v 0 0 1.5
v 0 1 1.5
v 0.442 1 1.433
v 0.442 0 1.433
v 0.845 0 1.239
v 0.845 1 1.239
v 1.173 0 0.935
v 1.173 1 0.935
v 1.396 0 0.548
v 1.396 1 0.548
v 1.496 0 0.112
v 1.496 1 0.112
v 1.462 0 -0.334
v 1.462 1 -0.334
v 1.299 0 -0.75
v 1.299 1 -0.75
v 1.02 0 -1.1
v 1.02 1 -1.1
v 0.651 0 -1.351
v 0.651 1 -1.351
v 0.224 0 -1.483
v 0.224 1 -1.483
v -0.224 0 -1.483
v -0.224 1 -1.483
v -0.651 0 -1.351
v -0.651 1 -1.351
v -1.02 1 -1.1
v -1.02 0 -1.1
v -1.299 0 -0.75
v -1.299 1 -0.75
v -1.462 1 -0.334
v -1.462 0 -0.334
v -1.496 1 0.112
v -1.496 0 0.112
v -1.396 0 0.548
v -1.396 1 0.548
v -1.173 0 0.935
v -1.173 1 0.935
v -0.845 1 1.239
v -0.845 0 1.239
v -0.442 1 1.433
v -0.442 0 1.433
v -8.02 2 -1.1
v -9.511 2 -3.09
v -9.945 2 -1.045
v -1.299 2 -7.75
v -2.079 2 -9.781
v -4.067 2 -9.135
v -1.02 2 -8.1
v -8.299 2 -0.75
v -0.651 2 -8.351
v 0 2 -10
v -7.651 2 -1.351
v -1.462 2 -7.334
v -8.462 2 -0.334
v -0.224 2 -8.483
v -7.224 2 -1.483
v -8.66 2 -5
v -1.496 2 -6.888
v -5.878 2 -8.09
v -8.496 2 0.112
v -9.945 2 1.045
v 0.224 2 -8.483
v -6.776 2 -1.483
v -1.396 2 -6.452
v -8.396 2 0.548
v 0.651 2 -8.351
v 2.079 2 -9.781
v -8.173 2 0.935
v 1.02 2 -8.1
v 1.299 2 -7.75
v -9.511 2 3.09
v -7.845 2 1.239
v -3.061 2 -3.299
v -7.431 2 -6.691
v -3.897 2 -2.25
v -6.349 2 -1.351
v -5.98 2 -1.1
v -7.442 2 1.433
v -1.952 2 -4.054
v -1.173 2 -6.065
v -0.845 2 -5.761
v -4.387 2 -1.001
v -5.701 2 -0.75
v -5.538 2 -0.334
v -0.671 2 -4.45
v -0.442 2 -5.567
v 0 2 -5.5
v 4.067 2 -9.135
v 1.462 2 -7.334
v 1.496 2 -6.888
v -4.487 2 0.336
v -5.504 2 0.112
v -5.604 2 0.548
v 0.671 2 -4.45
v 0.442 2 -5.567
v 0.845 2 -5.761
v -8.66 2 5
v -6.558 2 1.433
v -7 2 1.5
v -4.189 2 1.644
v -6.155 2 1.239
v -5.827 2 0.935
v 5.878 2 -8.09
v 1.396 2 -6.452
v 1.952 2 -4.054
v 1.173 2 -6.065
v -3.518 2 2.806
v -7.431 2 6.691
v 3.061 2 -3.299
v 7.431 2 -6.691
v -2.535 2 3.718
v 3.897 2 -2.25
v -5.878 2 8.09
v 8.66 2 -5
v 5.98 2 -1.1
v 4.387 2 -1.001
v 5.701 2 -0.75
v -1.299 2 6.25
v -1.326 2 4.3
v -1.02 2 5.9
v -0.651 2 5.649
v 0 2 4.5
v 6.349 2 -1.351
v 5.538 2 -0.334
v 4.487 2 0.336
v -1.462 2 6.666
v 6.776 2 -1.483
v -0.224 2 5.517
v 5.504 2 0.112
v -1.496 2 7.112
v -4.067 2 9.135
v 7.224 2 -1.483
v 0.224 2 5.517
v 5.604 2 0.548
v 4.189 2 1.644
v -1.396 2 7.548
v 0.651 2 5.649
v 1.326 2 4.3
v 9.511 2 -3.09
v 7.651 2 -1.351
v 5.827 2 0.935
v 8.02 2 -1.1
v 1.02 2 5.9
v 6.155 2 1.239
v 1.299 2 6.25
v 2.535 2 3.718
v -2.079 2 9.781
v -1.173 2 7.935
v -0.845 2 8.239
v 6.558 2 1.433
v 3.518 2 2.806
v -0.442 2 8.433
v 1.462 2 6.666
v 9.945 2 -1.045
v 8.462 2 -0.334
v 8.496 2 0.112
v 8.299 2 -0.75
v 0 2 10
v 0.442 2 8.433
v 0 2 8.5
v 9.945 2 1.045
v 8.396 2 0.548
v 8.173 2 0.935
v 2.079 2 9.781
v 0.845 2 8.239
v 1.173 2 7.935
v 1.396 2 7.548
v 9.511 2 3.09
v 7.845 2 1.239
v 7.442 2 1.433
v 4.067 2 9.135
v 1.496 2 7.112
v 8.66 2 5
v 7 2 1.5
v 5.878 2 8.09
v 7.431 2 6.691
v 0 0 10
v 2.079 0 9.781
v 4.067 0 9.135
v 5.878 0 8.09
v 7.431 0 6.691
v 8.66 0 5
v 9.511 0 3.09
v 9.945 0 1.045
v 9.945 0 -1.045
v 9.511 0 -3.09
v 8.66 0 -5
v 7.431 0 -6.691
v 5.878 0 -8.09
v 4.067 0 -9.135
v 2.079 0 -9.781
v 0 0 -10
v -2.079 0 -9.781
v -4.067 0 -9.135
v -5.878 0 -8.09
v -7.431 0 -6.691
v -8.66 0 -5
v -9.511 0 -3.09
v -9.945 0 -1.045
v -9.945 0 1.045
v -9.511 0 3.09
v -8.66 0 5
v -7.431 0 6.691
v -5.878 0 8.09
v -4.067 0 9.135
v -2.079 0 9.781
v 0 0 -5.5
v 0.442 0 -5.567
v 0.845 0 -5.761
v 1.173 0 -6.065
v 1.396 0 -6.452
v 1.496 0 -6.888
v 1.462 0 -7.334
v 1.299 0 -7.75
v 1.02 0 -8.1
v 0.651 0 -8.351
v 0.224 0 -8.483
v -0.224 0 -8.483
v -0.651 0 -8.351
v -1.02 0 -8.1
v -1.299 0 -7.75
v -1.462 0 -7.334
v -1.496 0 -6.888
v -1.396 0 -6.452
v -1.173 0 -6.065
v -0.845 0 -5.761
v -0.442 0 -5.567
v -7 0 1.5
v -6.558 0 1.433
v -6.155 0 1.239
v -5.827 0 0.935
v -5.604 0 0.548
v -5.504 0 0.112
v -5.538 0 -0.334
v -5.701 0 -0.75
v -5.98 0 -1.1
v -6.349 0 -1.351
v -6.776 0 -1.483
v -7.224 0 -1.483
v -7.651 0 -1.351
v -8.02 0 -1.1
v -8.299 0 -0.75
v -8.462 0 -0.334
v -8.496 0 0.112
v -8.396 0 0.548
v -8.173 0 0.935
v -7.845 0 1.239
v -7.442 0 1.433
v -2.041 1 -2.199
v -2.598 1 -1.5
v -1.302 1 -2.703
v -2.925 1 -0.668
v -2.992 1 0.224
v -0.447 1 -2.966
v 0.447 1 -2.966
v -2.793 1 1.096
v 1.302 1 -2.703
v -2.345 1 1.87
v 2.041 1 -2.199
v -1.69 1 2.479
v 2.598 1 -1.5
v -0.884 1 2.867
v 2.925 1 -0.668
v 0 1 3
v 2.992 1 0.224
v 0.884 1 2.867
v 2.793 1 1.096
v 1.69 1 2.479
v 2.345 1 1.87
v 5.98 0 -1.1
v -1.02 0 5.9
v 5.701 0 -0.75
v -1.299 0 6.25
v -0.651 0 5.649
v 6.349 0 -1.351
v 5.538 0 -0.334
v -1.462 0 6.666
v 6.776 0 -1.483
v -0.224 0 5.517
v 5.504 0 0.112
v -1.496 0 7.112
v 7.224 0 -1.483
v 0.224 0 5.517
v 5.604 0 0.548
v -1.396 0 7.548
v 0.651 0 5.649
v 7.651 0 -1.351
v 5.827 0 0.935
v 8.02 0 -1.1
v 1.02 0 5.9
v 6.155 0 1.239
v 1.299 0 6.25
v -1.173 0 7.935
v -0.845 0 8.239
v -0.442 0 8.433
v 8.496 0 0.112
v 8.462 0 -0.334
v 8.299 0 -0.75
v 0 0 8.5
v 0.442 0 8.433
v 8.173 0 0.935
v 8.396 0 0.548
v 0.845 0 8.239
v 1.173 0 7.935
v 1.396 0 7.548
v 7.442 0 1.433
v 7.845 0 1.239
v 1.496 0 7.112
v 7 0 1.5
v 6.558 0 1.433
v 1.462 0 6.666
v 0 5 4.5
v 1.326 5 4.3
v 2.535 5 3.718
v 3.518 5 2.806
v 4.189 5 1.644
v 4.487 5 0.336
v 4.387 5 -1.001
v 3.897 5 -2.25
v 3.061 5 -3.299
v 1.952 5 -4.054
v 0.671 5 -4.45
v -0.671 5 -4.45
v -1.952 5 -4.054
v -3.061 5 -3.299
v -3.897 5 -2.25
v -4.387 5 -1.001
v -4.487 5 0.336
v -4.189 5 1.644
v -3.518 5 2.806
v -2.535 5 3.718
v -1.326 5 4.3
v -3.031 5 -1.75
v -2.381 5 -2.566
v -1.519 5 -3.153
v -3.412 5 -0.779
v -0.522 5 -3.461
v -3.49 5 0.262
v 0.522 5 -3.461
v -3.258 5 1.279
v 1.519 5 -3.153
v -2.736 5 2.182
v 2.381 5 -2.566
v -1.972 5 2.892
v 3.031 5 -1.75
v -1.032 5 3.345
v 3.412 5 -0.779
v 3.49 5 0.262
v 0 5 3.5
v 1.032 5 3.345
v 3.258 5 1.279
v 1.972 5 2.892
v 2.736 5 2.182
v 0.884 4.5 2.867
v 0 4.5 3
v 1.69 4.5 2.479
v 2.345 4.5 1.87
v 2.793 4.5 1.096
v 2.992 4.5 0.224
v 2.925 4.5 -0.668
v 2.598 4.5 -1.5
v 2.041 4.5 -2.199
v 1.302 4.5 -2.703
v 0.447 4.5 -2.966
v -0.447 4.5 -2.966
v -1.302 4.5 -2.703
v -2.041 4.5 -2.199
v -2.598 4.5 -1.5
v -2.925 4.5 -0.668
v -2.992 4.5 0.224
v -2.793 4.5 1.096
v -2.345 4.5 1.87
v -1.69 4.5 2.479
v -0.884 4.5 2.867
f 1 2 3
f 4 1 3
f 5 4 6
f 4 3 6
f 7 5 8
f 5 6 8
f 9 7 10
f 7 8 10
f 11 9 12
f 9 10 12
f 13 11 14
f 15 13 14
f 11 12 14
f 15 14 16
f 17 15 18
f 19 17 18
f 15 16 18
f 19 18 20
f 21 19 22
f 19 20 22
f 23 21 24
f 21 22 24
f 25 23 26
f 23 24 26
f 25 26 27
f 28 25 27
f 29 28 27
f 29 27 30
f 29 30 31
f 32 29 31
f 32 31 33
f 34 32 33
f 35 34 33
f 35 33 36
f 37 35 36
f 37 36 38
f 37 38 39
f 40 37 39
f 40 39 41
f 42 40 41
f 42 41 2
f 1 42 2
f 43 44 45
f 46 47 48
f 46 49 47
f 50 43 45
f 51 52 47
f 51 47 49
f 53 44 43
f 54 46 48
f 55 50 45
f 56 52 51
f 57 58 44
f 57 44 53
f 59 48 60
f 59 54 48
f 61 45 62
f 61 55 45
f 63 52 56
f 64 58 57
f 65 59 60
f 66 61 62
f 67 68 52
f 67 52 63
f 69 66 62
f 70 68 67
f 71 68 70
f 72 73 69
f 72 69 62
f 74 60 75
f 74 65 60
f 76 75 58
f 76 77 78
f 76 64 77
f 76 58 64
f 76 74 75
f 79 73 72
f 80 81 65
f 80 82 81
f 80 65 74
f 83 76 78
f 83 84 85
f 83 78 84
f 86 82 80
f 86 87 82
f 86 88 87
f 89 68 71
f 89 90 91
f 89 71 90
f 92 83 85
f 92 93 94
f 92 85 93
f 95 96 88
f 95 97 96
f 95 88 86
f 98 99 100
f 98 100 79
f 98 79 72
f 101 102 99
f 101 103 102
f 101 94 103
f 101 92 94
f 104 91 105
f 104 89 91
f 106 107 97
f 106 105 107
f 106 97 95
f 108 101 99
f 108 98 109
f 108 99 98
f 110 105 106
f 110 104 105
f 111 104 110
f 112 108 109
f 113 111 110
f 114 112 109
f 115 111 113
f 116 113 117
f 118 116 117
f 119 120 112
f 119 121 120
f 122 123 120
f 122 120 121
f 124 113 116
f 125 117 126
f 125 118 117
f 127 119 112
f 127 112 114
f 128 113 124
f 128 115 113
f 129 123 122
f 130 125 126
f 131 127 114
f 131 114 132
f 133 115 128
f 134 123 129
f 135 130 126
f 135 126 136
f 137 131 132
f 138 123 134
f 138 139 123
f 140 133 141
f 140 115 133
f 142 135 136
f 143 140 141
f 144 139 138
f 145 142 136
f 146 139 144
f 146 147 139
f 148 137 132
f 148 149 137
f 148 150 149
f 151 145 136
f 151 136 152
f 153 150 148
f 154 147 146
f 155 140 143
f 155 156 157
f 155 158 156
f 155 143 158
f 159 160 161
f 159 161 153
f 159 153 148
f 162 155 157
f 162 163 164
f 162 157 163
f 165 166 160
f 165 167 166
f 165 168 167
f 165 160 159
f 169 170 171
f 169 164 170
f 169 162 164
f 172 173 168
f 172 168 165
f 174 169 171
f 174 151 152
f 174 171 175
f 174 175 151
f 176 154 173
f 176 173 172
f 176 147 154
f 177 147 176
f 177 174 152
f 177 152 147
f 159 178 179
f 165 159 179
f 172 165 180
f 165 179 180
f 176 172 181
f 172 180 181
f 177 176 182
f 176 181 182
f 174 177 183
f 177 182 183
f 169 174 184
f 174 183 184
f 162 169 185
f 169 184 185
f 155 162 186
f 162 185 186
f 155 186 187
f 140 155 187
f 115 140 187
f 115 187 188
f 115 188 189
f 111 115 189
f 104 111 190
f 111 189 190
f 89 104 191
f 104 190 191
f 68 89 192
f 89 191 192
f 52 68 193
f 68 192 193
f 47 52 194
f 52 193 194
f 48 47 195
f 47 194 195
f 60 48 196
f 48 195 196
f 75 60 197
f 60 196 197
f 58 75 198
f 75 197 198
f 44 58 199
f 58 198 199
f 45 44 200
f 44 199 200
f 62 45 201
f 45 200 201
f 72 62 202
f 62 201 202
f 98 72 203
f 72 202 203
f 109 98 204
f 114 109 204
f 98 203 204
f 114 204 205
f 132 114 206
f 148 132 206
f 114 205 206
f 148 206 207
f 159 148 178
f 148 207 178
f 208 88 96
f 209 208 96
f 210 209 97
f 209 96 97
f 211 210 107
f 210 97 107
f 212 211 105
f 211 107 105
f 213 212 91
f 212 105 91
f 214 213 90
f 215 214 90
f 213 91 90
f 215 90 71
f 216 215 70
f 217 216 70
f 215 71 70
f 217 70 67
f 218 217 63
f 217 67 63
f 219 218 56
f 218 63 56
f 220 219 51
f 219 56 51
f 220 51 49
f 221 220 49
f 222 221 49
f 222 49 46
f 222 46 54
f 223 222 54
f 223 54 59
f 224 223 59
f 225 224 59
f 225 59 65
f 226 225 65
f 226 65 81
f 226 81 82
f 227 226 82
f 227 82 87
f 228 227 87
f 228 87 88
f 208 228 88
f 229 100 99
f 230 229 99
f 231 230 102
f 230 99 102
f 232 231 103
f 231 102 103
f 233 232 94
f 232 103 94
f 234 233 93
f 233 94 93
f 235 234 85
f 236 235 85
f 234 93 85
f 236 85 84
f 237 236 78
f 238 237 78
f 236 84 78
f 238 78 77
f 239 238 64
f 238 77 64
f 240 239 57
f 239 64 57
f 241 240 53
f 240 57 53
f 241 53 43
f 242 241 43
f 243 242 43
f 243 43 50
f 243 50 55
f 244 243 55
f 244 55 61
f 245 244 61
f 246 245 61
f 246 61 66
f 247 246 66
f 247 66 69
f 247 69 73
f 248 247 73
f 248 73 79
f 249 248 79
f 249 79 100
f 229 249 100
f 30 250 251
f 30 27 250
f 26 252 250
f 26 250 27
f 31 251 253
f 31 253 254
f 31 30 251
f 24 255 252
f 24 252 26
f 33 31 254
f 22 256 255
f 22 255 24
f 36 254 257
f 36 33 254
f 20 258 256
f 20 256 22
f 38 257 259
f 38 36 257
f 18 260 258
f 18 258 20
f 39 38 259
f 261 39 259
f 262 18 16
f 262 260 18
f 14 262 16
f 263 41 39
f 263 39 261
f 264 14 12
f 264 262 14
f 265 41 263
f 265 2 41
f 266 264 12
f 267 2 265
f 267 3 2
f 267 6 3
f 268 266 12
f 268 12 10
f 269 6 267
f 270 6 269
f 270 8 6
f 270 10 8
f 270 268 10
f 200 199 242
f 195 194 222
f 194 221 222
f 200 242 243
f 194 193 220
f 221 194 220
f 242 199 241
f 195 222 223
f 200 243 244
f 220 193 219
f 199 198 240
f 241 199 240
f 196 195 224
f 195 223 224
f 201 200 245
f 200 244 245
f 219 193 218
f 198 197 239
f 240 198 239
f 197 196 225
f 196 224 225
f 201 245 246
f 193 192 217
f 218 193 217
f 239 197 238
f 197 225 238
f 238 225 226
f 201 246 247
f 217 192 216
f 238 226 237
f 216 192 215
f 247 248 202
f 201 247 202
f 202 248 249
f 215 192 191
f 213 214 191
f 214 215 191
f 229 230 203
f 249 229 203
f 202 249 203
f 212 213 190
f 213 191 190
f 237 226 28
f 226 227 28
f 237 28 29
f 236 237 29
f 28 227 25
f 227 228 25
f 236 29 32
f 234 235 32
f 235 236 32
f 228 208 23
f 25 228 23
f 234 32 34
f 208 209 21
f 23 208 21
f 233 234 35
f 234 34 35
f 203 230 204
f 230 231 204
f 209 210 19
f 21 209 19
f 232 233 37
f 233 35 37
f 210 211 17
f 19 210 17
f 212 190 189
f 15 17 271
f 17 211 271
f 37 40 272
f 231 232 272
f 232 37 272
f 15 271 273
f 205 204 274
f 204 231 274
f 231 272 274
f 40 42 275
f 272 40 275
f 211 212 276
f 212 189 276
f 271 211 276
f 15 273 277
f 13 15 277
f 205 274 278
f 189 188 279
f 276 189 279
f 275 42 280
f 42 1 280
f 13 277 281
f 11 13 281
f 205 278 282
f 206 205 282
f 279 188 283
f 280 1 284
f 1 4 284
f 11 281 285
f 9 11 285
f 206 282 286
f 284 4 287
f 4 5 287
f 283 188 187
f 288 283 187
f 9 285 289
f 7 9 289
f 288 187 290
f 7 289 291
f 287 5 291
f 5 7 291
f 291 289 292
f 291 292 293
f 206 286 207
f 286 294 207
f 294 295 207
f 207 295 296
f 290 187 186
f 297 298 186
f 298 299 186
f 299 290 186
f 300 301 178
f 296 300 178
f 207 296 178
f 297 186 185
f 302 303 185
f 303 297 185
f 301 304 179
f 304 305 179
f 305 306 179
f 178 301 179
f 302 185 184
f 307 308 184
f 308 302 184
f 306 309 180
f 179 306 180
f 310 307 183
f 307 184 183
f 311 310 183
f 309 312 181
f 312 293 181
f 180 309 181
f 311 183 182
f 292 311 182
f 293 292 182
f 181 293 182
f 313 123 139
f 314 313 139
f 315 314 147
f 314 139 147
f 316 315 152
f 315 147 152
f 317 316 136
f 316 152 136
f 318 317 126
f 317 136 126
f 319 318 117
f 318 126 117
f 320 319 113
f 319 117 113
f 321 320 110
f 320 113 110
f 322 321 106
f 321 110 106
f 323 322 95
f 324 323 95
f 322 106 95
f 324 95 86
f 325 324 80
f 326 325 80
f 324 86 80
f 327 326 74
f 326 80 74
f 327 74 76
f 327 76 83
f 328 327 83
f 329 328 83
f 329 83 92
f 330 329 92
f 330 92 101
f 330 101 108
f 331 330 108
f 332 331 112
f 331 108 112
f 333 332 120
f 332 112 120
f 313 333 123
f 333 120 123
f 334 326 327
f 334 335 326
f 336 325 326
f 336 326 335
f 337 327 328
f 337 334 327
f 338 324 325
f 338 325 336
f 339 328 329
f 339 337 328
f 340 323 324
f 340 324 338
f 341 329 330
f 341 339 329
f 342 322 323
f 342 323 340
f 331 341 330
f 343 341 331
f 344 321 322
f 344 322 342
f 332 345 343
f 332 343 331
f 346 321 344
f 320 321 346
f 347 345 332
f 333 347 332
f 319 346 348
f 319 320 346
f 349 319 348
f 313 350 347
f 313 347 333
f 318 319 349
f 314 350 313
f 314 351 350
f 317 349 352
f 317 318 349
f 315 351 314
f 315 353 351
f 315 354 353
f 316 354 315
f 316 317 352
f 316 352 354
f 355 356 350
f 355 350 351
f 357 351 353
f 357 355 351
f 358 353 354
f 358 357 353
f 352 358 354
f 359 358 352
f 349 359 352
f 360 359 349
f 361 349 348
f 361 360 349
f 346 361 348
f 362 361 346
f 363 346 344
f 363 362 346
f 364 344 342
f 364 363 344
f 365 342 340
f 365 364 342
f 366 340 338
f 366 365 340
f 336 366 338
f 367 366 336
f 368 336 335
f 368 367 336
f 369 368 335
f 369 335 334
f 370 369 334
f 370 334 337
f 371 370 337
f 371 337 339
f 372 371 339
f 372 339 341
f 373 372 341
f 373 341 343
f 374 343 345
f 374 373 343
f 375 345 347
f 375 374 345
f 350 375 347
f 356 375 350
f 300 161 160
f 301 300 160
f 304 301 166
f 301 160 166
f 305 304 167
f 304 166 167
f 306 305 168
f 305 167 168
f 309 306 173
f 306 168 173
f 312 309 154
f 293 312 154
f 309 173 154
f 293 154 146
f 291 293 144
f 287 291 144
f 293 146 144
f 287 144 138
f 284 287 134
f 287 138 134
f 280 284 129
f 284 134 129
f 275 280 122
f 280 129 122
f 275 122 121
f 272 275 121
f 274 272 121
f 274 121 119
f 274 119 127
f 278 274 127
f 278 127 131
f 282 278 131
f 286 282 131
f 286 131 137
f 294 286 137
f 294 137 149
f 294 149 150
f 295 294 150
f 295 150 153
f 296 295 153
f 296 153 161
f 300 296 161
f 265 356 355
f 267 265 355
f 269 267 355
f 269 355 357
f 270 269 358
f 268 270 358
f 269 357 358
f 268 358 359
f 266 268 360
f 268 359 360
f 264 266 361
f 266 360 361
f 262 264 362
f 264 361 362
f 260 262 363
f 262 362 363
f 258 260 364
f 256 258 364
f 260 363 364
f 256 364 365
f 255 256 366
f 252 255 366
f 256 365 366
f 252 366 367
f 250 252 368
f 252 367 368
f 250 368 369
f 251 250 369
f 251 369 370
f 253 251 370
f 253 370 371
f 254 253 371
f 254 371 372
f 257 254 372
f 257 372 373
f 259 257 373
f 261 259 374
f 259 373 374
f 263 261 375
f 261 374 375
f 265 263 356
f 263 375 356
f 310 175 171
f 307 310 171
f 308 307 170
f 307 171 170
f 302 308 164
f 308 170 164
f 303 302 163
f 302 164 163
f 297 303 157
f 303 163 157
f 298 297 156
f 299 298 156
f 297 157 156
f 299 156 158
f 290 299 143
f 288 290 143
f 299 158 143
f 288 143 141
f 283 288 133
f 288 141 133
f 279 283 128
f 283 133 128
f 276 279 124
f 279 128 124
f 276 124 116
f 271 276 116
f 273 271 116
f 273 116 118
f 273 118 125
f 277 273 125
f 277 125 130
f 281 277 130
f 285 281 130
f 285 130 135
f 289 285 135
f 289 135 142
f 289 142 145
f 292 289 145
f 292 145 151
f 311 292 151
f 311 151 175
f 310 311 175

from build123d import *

# Parameters (mm, degrees)
SKETCH_1_R          = 10
EXTRUDE_1_DEPTH     = 2
SKETCH_2_R          = 4.5
EXTRUDE_2_DEPTH     = 3
SKETCH_3_R          = 1.5
CUT_EXTRUDE_1_DEPTH = 3
SKETCH_4_R          = 3
CUT_EXTRUDE_2_DEPTH = 4
SKETCH_5_R          = 1.5
CUT_EXTRUDE_3_DEPTH = 4
CHAMFER_2_SIZE      = 0.5


with BuildPart() as part:
    # 草图1 → 凸台-拉伸1 (new body)
    with BuildSketch(Plane(origin=(0, 0, 0), x_dir=(1, 0, 0), z_dir=(0, 1, 0))):
        with Locations(Location((0, 0, 0), (0, 0, 270))):
            Circle(SKETCH_1_R)
    extrude(amount=EXTRUDE_1_DEPTH)

    # 草图2 → 凸台-拉伸2 (add)
    with BuildSketch(Plane(origin=(0, 2, 0), x_dir=(1, 0, 0), z_dir=(0, 1, 0))):
        with Locations(Location((0, 0, 0), (0, 0, 270))):
            Circle(SKETCH_2_R)
    extrude(amount=EXTRUDE_2_DEPTH)

    # 草图3 → 切除-拉伸1 (cut)
    with BuildSketch(Plane(origin=(0, 2, 0), x_dir=(1, 0, 0), z_dir=(0, 1, 0))):
        with Locations(Location((-7, 0, 0), (0, 0, 270))):
            Circle(SKETCH_3_R)
        with Locations(Location((0, 7, 0), (0, 0, 270))):
            Circle(SKETCH_3_R)
        with Locations(Location((7, 0, 0), (0, 0, 270))):
            Circle(SKETCH_3_R)
        with Locations(Location((0, -7, 0), (0, 0, 270))):
            Circle(SKETCH_3_R)
    extrude(amount=-CUT_EXTRUDE_1_DEPTH, mode=Mode.SUBTRACT)

    # 草图4 → 切除-拉伸2 (cut)
    with BuildSketch(Plane(origin=(0, 5, 0), x_dir=(1, 0, 0), z_dir=(0, 1, 0))):
        with Locations(Location((0, 0, 0), (0, 0, 270))):
            Circle(SKETCH_4_R)
    extrude(amount=-CUT_EXTRUDE_2_DEPTH, mode=Mode.SUBTRACT)

    # 草图5 → 切除-拉伸3 (cut)
    with BuildSketch(Plane(origin=(0, 1, 0), x_dir=(1, 0, 0), z_dir=(0, 1, 0))):
        with Locations(Location((0, 0, 0), (0, 0, 270))):
            Circle(SKETCH_5_R)
    extrude(amount=-CUT_EXTRUDE_3_DEPTH, mode=Mode.SUBTRACT)

    # 倒角2
    chamfer_2_edges = [part.edges().sort_by_distance(p)[0] for p in [
        (0, 5, -3),
    ]]
    chamfer(chamfer_2_edges, length=CHAMFER_2_SIZE)


solid = part.part
